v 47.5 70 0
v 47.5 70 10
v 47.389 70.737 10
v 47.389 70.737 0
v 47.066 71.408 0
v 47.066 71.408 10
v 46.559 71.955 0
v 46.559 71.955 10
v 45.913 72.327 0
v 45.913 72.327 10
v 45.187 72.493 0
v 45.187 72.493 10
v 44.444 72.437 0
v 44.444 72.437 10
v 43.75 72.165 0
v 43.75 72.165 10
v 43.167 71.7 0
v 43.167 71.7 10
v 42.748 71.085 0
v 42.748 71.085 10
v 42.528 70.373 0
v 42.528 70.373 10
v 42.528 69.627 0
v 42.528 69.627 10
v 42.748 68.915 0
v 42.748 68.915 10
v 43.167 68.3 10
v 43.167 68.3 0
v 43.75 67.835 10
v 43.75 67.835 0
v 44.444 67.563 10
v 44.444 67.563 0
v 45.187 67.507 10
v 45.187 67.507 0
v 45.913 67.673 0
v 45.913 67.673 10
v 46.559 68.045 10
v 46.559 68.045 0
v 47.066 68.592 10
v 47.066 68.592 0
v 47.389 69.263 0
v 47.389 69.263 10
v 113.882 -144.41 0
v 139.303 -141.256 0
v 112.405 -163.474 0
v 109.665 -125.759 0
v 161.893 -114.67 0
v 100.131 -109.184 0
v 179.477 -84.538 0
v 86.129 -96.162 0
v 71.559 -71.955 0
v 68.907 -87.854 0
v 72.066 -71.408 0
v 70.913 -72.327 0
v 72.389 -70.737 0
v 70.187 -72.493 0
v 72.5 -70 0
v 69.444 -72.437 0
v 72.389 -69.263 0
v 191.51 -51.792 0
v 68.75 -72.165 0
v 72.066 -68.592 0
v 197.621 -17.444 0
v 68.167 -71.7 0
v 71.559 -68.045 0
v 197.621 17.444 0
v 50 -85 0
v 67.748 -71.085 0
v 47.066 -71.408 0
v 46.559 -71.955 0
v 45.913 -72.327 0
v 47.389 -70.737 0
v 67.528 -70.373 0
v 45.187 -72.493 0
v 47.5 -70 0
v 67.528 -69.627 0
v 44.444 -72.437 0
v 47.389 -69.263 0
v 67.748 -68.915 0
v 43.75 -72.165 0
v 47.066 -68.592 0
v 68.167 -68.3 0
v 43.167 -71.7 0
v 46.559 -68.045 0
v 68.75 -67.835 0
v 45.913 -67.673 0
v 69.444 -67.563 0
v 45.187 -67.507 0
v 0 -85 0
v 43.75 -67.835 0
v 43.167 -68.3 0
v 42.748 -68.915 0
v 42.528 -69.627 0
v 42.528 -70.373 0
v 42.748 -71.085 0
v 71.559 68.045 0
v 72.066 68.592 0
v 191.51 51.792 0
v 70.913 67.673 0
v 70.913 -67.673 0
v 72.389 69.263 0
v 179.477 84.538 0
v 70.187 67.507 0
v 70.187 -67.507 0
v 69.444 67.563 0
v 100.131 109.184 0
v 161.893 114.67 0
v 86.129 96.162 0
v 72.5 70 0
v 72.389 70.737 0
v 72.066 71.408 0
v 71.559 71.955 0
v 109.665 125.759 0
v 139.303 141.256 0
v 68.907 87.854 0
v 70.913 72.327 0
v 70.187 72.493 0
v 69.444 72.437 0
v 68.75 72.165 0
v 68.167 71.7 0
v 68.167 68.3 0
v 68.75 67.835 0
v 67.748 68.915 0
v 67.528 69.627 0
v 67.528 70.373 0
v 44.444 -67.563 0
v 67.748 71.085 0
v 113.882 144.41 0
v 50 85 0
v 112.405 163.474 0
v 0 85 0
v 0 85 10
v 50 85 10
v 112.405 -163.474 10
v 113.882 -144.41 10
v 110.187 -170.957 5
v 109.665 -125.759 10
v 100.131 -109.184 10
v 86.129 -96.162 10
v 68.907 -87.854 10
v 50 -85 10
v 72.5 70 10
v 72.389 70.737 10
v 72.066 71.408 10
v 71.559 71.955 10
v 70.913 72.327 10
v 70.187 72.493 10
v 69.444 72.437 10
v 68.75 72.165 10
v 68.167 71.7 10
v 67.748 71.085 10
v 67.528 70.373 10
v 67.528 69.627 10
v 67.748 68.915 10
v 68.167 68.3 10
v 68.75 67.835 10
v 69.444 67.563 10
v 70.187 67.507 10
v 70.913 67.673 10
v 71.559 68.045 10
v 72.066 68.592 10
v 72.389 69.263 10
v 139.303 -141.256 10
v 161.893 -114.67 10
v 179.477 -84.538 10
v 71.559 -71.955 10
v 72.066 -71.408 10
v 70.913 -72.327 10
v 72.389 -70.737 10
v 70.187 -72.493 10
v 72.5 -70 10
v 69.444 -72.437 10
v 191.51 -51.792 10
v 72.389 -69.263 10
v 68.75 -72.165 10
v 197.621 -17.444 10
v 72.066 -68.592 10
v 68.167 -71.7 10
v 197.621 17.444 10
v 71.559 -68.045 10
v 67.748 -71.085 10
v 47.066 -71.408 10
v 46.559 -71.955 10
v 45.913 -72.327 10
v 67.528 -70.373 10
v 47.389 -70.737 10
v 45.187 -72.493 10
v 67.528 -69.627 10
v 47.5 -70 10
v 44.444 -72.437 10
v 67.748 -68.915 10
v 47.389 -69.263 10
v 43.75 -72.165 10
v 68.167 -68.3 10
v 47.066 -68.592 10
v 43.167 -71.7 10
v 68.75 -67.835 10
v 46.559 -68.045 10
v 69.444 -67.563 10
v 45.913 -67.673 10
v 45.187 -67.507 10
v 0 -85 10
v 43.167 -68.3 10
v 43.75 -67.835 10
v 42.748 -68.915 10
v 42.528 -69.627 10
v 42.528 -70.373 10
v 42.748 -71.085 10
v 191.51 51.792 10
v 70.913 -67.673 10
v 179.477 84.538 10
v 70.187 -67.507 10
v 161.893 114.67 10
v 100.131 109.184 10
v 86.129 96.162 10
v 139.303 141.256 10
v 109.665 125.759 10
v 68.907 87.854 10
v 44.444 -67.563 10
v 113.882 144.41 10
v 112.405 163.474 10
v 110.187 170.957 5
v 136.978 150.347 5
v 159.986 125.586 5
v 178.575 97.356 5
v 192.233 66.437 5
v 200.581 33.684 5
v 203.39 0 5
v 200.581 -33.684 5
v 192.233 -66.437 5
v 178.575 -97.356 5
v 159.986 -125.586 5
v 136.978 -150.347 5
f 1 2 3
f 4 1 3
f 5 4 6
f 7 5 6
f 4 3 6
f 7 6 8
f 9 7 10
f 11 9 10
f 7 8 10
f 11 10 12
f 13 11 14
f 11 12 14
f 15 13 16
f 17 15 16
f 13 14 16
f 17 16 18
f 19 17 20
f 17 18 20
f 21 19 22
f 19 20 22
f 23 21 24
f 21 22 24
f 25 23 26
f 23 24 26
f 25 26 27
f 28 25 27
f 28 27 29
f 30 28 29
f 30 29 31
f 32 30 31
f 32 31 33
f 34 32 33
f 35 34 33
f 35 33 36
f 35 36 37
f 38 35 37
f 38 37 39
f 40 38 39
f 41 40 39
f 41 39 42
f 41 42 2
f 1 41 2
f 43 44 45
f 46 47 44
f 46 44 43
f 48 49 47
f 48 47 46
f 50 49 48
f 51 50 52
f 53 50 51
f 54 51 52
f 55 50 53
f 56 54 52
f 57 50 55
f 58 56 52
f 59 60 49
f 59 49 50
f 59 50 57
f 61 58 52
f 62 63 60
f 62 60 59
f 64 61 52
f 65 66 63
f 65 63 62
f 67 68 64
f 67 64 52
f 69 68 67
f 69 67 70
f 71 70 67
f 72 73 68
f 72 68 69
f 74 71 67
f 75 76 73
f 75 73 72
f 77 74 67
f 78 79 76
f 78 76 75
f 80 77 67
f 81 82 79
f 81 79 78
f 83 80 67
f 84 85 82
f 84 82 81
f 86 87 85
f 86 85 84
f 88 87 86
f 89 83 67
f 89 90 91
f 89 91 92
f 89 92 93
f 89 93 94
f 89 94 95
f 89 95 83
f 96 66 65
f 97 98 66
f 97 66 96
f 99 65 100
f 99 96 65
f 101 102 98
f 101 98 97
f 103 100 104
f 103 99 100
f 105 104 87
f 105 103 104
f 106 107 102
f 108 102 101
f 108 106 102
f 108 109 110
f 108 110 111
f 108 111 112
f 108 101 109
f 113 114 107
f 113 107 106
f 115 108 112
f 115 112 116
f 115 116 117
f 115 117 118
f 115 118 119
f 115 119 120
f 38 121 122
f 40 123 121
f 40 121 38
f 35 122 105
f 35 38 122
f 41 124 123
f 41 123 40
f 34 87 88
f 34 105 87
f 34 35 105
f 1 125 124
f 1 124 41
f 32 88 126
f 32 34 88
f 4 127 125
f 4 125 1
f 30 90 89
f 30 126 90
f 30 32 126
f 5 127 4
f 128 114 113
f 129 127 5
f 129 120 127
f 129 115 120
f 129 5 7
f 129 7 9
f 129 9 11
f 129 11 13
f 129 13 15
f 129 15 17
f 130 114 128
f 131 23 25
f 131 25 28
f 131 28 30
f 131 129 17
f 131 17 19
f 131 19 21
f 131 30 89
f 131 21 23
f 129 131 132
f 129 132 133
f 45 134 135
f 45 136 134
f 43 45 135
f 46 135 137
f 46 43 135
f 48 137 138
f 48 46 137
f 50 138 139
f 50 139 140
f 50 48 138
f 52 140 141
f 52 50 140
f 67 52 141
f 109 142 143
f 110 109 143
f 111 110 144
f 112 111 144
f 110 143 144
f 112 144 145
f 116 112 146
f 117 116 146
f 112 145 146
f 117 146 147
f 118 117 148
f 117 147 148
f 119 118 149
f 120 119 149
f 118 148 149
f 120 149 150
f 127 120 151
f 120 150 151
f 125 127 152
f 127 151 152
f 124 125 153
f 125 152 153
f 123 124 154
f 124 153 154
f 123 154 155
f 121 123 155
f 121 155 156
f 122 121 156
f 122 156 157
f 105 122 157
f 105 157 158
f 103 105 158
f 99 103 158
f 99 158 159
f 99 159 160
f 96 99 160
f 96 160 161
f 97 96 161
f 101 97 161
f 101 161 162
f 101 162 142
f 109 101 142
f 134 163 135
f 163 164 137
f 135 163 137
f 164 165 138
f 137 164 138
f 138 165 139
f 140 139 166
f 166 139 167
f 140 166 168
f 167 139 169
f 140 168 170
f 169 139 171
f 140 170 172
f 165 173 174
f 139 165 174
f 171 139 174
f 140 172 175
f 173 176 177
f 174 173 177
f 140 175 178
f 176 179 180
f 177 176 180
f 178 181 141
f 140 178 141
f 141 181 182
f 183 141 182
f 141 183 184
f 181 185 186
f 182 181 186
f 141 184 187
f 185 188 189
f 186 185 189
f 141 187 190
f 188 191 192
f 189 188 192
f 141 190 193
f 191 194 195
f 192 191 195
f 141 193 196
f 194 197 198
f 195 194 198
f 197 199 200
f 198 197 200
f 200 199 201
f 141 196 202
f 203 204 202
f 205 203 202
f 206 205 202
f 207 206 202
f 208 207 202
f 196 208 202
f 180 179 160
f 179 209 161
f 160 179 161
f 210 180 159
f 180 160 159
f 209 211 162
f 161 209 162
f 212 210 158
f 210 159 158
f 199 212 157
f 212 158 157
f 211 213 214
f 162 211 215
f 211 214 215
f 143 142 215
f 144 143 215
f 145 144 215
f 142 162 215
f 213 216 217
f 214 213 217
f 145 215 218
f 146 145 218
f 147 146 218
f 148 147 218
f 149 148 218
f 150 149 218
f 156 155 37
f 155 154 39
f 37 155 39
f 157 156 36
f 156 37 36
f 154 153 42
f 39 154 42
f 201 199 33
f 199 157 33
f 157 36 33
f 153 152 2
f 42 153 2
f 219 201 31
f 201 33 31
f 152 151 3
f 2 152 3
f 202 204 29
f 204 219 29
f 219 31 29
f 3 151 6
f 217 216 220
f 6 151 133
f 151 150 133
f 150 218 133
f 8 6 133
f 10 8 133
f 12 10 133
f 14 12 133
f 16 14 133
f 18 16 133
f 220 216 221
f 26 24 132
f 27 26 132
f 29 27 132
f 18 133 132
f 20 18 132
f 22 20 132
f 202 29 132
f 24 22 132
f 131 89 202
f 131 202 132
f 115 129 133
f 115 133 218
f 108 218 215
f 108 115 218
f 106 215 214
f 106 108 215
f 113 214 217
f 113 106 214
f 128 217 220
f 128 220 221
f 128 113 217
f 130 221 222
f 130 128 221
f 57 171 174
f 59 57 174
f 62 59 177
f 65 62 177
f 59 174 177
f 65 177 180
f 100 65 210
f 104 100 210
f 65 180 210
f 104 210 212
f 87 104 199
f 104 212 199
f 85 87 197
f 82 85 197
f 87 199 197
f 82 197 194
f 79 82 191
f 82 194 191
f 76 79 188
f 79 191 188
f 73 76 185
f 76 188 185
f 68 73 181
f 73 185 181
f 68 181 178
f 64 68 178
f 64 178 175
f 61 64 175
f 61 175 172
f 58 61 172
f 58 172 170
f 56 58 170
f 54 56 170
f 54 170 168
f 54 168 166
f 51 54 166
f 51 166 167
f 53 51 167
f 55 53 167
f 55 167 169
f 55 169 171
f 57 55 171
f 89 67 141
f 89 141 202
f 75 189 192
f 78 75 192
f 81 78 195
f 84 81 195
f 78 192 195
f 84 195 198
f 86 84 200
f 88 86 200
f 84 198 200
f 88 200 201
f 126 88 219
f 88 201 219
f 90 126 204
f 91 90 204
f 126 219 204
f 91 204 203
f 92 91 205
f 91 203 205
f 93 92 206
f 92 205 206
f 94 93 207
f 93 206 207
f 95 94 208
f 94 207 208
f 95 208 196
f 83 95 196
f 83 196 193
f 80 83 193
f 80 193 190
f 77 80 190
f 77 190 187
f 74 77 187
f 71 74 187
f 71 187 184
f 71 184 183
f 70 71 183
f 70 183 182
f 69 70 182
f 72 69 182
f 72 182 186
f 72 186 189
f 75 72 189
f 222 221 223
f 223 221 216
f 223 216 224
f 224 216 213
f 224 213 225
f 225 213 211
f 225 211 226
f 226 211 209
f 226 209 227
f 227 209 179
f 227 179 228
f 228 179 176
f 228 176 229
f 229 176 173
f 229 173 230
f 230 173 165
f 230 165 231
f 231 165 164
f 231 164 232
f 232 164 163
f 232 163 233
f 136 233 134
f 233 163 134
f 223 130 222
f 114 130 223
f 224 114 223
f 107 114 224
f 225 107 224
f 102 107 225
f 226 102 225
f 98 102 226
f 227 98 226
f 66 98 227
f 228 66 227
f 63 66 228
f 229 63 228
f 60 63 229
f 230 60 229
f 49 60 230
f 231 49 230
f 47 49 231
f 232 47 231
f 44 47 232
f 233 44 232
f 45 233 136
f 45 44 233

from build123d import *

# Parameters (mm, degrees)
EXTRUDE_1_DEPTH     = 10
CHAMFER_2_SIZE      = 5
SKETCH_2_R          = 2.5
CUT_EXTRUDE_1_DEPTH = 30


with BuildPart() as part:
    # Эскиз1 → Бобышка-Вытянуть1 (new body)
    with BuildSketch(Plane.XY):
        with BuildLine():
            Line((0, -85), (0, 85))
            Line((0, 85), (50, 85))
            ThreePointArc((50, 85), (102.466768683, 112.312471025), (110.187404416, 170.956521648))
            ThreePointArc((110.187404416, 170.956521648), (203.389764703, 0), (110.187404416, -170.956521648))
            ThreePointArc((110.187404416, -170.956521648), (102.466768683, -112.312471025), (50, -85))
            Line((50, -85), (0, -85))
        make_face()
    extrude(amount=EXTRUDE_1_DEPTH)

    # Фаска2
    chamfer_2_edges = [part.edges().sort_by_distance(p)[0] for p in [
        (203.389764703, 0, 0),
        (203.389764703, 0, 10),
    ]]
    chamfer(chamfer_2_edges, length=CHAMFER_2_SIZE - 0.0001)  # a hair under: the kernel refuses the full size

    # Эскиз2 → Вырез-Вытянуть1 (cut)
    with BuildSketch(Plane.XY.offset(10)):
        with Locations((45, -70)):
            Circle(SKETCH_2_R)
        with Locations((70, -70)):
            Circle(SKETCH_2_R)
        with Locations((70, 70)):
            Circle(SKETCH_2_R)
        with Locations((45, 70)):
            Circle(SKETCH_2_R)
    extrude(amount=-CUT_EXTRUDE_1_DEPTH, mode=Mode.SUBTRACT)


solid = part.part
